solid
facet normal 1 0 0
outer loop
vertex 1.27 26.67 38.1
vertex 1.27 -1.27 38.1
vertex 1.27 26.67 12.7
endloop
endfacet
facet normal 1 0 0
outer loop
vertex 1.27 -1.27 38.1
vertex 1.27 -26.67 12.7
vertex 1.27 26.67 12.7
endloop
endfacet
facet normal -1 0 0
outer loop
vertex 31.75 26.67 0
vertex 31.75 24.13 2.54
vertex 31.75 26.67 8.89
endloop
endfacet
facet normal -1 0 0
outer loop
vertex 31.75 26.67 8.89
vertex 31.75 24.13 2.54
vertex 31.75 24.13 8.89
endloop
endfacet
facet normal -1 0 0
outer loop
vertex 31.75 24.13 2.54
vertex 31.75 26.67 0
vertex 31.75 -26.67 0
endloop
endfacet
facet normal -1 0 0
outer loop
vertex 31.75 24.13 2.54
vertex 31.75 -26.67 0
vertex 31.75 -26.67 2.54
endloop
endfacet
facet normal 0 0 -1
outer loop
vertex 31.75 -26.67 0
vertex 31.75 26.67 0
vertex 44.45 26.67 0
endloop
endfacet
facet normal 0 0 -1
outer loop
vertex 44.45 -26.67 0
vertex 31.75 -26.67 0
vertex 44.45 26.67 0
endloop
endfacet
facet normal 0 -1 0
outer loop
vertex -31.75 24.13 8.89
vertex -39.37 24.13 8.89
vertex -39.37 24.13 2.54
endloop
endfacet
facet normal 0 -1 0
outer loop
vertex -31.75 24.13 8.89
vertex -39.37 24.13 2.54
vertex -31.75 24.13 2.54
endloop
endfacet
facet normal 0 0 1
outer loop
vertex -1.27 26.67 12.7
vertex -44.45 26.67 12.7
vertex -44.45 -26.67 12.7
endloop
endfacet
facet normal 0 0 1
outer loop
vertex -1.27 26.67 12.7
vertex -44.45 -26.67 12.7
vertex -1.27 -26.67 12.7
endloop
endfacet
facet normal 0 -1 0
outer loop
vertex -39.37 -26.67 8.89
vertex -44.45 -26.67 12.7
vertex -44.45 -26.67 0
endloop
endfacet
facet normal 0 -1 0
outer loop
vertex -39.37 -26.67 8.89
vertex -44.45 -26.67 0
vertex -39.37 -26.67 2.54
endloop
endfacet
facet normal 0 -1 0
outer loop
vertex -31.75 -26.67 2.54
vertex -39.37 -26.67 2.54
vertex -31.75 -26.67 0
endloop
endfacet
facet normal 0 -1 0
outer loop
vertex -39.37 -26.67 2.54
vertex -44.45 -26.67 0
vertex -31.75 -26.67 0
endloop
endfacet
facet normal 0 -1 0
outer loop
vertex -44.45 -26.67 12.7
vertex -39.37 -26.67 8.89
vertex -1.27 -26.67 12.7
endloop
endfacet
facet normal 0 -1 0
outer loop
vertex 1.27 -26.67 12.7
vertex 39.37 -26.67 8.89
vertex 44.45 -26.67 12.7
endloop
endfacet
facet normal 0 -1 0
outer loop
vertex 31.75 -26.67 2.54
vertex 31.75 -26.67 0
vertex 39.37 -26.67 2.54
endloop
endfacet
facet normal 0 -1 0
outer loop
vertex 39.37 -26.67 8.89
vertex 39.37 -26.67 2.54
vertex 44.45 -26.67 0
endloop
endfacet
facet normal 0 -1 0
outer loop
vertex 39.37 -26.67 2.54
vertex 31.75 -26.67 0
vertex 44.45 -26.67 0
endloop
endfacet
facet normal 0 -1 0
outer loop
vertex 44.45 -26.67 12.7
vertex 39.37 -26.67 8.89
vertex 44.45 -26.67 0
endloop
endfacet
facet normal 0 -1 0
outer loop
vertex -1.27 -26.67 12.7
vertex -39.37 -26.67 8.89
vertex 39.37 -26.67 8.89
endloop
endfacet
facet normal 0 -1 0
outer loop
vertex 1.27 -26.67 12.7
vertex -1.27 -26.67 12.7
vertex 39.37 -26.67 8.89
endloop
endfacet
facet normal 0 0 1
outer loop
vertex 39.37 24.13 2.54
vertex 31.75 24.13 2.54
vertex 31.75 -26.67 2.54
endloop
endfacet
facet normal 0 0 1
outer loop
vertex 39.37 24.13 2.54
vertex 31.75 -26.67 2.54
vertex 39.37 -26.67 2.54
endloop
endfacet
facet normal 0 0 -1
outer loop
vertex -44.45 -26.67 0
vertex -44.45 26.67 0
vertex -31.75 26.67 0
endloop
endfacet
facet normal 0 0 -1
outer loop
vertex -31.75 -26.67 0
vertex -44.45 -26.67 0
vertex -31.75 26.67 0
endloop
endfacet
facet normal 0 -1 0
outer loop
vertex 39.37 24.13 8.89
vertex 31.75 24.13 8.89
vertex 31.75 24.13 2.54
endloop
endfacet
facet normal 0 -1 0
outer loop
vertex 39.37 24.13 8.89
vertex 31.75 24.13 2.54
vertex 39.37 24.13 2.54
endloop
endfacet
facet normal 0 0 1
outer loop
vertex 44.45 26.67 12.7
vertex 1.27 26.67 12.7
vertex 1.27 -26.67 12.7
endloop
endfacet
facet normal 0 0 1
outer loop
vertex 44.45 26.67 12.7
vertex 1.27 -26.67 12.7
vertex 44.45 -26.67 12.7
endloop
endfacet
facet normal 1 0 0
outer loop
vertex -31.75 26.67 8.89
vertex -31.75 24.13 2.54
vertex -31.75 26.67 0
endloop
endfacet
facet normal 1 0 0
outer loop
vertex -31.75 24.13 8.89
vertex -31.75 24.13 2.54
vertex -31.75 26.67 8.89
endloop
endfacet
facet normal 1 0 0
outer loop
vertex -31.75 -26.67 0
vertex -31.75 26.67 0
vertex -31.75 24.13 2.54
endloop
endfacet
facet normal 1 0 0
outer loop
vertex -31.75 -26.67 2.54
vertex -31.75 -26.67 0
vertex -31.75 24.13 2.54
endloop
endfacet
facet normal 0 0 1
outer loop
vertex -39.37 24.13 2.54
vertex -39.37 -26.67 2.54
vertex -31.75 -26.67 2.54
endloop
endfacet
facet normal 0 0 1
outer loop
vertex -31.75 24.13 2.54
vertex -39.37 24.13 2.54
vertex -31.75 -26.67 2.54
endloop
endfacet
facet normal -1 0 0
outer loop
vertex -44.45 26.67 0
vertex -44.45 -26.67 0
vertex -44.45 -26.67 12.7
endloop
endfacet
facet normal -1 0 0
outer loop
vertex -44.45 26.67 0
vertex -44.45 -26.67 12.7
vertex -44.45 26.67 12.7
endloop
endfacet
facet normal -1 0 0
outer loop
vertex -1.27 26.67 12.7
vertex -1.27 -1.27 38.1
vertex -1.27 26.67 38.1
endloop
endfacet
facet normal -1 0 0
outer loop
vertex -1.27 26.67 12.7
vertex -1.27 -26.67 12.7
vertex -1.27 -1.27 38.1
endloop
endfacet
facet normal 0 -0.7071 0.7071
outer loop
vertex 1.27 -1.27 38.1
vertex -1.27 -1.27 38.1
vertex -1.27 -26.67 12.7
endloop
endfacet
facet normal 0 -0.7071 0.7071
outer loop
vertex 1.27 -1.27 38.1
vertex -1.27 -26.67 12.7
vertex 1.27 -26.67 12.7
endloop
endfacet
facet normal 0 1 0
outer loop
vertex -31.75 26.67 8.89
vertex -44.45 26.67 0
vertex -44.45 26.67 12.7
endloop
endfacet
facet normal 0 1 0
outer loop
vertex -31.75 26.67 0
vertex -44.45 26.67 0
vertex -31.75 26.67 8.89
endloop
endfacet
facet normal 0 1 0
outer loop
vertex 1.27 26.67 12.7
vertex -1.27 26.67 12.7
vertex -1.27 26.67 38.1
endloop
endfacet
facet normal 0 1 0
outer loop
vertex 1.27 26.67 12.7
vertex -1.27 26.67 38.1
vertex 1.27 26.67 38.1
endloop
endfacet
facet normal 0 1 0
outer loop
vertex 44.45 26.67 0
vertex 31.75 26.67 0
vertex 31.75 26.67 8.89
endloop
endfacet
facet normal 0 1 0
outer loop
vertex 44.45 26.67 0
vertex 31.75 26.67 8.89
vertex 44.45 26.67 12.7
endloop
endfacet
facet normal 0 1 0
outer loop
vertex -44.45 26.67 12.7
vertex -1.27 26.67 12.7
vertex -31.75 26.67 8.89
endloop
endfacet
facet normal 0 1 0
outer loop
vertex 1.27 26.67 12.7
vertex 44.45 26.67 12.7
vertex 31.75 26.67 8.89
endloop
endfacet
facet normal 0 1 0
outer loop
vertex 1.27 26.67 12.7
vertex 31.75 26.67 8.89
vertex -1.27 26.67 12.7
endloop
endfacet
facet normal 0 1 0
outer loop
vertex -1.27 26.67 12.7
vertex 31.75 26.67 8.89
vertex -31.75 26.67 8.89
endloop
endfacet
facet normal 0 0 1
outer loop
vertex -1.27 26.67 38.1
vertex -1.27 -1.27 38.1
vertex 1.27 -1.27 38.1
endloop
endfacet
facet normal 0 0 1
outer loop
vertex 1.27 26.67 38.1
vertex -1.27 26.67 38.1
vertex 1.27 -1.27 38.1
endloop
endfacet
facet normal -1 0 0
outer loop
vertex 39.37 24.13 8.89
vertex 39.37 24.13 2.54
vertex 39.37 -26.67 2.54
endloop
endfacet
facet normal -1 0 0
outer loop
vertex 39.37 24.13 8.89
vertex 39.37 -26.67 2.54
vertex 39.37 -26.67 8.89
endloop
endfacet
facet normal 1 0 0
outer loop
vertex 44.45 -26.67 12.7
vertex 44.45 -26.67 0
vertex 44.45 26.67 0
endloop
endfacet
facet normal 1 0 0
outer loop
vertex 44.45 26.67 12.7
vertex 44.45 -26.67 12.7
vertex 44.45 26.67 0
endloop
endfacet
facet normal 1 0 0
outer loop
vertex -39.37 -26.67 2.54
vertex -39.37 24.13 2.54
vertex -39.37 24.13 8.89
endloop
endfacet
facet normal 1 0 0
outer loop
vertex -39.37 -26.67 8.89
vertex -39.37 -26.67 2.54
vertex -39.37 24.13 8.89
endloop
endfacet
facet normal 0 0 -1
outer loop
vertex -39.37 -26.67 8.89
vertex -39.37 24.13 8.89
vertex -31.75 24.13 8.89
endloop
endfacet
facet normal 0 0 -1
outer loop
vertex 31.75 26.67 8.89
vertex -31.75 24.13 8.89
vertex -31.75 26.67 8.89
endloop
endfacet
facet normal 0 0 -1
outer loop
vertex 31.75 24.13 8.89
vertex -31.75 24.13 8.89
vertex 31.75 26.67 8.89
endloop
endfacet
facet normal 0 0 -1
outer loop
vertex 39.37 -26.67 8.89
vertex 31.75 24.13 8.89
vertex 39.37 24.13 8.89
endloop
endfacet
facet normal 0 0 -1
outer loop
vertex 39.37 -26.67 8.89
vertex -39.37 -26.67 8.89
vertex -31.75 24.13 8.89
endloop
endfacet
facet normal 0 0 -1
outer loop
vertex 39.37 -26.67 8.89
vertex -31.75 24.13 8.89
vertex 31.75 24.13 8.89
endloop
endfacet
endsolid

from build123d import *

# Parameters (mm, degrees)
F0_W     = 88.9
F0_H     = 53.34
F1_DEPTH = 12.7
F2_W     = 78.74
F2_H     = 6.35
F3_DEPTH = 50.8
F4_W     = 63.5
F4_H     = 17.78
F5_DEPTH = 53.341
F6_W     = 2.54
F6_H     = 53.34
F7_DEPTH = 25.4
F8_SIZE  = 25.4


with BuildPart() as f1:
    # F0 (on Top) → F1 (new body)
    with BuildSketch(Plane.XY):
        Rectangle(F0_W, F0_H)
    extrude(amount=F1_DEPTH)

    # F2 (on face) → F3 (cut)
    with BuildSketch(Plane.XZ.offset(26.67)):
        with Locations((0, 5.715)):
            Rectangle(F2_W, F2_H)
    extrude(amount=-F3_DEPTH, mode=Mode.SUBTRACT)

    # F4 (on face) → F5 (cut, through all)
    with BuildSketch(Plane.XZ.offset(26.67)):
        Rectangle(F4_W, F4_H)
    extrude(amount=-F5_DEPTH, mode=Mode.SUBTRACT)

    # F6 (on face) → F7 (join)
    with BuildSketch(Plane.XY.offset(12.7)):
        Rectangle(F6_W, F6_H)
    extrude(amount=F7_DEPTH)

    # F8
    f8_edges = [f1.edges().sort_by_distance(p)[0] for p in [
        (0, -26.67, 38.1),
    ]]
    chamfer(f8_edges, length=F8_SIZE)


solid = f1.part
